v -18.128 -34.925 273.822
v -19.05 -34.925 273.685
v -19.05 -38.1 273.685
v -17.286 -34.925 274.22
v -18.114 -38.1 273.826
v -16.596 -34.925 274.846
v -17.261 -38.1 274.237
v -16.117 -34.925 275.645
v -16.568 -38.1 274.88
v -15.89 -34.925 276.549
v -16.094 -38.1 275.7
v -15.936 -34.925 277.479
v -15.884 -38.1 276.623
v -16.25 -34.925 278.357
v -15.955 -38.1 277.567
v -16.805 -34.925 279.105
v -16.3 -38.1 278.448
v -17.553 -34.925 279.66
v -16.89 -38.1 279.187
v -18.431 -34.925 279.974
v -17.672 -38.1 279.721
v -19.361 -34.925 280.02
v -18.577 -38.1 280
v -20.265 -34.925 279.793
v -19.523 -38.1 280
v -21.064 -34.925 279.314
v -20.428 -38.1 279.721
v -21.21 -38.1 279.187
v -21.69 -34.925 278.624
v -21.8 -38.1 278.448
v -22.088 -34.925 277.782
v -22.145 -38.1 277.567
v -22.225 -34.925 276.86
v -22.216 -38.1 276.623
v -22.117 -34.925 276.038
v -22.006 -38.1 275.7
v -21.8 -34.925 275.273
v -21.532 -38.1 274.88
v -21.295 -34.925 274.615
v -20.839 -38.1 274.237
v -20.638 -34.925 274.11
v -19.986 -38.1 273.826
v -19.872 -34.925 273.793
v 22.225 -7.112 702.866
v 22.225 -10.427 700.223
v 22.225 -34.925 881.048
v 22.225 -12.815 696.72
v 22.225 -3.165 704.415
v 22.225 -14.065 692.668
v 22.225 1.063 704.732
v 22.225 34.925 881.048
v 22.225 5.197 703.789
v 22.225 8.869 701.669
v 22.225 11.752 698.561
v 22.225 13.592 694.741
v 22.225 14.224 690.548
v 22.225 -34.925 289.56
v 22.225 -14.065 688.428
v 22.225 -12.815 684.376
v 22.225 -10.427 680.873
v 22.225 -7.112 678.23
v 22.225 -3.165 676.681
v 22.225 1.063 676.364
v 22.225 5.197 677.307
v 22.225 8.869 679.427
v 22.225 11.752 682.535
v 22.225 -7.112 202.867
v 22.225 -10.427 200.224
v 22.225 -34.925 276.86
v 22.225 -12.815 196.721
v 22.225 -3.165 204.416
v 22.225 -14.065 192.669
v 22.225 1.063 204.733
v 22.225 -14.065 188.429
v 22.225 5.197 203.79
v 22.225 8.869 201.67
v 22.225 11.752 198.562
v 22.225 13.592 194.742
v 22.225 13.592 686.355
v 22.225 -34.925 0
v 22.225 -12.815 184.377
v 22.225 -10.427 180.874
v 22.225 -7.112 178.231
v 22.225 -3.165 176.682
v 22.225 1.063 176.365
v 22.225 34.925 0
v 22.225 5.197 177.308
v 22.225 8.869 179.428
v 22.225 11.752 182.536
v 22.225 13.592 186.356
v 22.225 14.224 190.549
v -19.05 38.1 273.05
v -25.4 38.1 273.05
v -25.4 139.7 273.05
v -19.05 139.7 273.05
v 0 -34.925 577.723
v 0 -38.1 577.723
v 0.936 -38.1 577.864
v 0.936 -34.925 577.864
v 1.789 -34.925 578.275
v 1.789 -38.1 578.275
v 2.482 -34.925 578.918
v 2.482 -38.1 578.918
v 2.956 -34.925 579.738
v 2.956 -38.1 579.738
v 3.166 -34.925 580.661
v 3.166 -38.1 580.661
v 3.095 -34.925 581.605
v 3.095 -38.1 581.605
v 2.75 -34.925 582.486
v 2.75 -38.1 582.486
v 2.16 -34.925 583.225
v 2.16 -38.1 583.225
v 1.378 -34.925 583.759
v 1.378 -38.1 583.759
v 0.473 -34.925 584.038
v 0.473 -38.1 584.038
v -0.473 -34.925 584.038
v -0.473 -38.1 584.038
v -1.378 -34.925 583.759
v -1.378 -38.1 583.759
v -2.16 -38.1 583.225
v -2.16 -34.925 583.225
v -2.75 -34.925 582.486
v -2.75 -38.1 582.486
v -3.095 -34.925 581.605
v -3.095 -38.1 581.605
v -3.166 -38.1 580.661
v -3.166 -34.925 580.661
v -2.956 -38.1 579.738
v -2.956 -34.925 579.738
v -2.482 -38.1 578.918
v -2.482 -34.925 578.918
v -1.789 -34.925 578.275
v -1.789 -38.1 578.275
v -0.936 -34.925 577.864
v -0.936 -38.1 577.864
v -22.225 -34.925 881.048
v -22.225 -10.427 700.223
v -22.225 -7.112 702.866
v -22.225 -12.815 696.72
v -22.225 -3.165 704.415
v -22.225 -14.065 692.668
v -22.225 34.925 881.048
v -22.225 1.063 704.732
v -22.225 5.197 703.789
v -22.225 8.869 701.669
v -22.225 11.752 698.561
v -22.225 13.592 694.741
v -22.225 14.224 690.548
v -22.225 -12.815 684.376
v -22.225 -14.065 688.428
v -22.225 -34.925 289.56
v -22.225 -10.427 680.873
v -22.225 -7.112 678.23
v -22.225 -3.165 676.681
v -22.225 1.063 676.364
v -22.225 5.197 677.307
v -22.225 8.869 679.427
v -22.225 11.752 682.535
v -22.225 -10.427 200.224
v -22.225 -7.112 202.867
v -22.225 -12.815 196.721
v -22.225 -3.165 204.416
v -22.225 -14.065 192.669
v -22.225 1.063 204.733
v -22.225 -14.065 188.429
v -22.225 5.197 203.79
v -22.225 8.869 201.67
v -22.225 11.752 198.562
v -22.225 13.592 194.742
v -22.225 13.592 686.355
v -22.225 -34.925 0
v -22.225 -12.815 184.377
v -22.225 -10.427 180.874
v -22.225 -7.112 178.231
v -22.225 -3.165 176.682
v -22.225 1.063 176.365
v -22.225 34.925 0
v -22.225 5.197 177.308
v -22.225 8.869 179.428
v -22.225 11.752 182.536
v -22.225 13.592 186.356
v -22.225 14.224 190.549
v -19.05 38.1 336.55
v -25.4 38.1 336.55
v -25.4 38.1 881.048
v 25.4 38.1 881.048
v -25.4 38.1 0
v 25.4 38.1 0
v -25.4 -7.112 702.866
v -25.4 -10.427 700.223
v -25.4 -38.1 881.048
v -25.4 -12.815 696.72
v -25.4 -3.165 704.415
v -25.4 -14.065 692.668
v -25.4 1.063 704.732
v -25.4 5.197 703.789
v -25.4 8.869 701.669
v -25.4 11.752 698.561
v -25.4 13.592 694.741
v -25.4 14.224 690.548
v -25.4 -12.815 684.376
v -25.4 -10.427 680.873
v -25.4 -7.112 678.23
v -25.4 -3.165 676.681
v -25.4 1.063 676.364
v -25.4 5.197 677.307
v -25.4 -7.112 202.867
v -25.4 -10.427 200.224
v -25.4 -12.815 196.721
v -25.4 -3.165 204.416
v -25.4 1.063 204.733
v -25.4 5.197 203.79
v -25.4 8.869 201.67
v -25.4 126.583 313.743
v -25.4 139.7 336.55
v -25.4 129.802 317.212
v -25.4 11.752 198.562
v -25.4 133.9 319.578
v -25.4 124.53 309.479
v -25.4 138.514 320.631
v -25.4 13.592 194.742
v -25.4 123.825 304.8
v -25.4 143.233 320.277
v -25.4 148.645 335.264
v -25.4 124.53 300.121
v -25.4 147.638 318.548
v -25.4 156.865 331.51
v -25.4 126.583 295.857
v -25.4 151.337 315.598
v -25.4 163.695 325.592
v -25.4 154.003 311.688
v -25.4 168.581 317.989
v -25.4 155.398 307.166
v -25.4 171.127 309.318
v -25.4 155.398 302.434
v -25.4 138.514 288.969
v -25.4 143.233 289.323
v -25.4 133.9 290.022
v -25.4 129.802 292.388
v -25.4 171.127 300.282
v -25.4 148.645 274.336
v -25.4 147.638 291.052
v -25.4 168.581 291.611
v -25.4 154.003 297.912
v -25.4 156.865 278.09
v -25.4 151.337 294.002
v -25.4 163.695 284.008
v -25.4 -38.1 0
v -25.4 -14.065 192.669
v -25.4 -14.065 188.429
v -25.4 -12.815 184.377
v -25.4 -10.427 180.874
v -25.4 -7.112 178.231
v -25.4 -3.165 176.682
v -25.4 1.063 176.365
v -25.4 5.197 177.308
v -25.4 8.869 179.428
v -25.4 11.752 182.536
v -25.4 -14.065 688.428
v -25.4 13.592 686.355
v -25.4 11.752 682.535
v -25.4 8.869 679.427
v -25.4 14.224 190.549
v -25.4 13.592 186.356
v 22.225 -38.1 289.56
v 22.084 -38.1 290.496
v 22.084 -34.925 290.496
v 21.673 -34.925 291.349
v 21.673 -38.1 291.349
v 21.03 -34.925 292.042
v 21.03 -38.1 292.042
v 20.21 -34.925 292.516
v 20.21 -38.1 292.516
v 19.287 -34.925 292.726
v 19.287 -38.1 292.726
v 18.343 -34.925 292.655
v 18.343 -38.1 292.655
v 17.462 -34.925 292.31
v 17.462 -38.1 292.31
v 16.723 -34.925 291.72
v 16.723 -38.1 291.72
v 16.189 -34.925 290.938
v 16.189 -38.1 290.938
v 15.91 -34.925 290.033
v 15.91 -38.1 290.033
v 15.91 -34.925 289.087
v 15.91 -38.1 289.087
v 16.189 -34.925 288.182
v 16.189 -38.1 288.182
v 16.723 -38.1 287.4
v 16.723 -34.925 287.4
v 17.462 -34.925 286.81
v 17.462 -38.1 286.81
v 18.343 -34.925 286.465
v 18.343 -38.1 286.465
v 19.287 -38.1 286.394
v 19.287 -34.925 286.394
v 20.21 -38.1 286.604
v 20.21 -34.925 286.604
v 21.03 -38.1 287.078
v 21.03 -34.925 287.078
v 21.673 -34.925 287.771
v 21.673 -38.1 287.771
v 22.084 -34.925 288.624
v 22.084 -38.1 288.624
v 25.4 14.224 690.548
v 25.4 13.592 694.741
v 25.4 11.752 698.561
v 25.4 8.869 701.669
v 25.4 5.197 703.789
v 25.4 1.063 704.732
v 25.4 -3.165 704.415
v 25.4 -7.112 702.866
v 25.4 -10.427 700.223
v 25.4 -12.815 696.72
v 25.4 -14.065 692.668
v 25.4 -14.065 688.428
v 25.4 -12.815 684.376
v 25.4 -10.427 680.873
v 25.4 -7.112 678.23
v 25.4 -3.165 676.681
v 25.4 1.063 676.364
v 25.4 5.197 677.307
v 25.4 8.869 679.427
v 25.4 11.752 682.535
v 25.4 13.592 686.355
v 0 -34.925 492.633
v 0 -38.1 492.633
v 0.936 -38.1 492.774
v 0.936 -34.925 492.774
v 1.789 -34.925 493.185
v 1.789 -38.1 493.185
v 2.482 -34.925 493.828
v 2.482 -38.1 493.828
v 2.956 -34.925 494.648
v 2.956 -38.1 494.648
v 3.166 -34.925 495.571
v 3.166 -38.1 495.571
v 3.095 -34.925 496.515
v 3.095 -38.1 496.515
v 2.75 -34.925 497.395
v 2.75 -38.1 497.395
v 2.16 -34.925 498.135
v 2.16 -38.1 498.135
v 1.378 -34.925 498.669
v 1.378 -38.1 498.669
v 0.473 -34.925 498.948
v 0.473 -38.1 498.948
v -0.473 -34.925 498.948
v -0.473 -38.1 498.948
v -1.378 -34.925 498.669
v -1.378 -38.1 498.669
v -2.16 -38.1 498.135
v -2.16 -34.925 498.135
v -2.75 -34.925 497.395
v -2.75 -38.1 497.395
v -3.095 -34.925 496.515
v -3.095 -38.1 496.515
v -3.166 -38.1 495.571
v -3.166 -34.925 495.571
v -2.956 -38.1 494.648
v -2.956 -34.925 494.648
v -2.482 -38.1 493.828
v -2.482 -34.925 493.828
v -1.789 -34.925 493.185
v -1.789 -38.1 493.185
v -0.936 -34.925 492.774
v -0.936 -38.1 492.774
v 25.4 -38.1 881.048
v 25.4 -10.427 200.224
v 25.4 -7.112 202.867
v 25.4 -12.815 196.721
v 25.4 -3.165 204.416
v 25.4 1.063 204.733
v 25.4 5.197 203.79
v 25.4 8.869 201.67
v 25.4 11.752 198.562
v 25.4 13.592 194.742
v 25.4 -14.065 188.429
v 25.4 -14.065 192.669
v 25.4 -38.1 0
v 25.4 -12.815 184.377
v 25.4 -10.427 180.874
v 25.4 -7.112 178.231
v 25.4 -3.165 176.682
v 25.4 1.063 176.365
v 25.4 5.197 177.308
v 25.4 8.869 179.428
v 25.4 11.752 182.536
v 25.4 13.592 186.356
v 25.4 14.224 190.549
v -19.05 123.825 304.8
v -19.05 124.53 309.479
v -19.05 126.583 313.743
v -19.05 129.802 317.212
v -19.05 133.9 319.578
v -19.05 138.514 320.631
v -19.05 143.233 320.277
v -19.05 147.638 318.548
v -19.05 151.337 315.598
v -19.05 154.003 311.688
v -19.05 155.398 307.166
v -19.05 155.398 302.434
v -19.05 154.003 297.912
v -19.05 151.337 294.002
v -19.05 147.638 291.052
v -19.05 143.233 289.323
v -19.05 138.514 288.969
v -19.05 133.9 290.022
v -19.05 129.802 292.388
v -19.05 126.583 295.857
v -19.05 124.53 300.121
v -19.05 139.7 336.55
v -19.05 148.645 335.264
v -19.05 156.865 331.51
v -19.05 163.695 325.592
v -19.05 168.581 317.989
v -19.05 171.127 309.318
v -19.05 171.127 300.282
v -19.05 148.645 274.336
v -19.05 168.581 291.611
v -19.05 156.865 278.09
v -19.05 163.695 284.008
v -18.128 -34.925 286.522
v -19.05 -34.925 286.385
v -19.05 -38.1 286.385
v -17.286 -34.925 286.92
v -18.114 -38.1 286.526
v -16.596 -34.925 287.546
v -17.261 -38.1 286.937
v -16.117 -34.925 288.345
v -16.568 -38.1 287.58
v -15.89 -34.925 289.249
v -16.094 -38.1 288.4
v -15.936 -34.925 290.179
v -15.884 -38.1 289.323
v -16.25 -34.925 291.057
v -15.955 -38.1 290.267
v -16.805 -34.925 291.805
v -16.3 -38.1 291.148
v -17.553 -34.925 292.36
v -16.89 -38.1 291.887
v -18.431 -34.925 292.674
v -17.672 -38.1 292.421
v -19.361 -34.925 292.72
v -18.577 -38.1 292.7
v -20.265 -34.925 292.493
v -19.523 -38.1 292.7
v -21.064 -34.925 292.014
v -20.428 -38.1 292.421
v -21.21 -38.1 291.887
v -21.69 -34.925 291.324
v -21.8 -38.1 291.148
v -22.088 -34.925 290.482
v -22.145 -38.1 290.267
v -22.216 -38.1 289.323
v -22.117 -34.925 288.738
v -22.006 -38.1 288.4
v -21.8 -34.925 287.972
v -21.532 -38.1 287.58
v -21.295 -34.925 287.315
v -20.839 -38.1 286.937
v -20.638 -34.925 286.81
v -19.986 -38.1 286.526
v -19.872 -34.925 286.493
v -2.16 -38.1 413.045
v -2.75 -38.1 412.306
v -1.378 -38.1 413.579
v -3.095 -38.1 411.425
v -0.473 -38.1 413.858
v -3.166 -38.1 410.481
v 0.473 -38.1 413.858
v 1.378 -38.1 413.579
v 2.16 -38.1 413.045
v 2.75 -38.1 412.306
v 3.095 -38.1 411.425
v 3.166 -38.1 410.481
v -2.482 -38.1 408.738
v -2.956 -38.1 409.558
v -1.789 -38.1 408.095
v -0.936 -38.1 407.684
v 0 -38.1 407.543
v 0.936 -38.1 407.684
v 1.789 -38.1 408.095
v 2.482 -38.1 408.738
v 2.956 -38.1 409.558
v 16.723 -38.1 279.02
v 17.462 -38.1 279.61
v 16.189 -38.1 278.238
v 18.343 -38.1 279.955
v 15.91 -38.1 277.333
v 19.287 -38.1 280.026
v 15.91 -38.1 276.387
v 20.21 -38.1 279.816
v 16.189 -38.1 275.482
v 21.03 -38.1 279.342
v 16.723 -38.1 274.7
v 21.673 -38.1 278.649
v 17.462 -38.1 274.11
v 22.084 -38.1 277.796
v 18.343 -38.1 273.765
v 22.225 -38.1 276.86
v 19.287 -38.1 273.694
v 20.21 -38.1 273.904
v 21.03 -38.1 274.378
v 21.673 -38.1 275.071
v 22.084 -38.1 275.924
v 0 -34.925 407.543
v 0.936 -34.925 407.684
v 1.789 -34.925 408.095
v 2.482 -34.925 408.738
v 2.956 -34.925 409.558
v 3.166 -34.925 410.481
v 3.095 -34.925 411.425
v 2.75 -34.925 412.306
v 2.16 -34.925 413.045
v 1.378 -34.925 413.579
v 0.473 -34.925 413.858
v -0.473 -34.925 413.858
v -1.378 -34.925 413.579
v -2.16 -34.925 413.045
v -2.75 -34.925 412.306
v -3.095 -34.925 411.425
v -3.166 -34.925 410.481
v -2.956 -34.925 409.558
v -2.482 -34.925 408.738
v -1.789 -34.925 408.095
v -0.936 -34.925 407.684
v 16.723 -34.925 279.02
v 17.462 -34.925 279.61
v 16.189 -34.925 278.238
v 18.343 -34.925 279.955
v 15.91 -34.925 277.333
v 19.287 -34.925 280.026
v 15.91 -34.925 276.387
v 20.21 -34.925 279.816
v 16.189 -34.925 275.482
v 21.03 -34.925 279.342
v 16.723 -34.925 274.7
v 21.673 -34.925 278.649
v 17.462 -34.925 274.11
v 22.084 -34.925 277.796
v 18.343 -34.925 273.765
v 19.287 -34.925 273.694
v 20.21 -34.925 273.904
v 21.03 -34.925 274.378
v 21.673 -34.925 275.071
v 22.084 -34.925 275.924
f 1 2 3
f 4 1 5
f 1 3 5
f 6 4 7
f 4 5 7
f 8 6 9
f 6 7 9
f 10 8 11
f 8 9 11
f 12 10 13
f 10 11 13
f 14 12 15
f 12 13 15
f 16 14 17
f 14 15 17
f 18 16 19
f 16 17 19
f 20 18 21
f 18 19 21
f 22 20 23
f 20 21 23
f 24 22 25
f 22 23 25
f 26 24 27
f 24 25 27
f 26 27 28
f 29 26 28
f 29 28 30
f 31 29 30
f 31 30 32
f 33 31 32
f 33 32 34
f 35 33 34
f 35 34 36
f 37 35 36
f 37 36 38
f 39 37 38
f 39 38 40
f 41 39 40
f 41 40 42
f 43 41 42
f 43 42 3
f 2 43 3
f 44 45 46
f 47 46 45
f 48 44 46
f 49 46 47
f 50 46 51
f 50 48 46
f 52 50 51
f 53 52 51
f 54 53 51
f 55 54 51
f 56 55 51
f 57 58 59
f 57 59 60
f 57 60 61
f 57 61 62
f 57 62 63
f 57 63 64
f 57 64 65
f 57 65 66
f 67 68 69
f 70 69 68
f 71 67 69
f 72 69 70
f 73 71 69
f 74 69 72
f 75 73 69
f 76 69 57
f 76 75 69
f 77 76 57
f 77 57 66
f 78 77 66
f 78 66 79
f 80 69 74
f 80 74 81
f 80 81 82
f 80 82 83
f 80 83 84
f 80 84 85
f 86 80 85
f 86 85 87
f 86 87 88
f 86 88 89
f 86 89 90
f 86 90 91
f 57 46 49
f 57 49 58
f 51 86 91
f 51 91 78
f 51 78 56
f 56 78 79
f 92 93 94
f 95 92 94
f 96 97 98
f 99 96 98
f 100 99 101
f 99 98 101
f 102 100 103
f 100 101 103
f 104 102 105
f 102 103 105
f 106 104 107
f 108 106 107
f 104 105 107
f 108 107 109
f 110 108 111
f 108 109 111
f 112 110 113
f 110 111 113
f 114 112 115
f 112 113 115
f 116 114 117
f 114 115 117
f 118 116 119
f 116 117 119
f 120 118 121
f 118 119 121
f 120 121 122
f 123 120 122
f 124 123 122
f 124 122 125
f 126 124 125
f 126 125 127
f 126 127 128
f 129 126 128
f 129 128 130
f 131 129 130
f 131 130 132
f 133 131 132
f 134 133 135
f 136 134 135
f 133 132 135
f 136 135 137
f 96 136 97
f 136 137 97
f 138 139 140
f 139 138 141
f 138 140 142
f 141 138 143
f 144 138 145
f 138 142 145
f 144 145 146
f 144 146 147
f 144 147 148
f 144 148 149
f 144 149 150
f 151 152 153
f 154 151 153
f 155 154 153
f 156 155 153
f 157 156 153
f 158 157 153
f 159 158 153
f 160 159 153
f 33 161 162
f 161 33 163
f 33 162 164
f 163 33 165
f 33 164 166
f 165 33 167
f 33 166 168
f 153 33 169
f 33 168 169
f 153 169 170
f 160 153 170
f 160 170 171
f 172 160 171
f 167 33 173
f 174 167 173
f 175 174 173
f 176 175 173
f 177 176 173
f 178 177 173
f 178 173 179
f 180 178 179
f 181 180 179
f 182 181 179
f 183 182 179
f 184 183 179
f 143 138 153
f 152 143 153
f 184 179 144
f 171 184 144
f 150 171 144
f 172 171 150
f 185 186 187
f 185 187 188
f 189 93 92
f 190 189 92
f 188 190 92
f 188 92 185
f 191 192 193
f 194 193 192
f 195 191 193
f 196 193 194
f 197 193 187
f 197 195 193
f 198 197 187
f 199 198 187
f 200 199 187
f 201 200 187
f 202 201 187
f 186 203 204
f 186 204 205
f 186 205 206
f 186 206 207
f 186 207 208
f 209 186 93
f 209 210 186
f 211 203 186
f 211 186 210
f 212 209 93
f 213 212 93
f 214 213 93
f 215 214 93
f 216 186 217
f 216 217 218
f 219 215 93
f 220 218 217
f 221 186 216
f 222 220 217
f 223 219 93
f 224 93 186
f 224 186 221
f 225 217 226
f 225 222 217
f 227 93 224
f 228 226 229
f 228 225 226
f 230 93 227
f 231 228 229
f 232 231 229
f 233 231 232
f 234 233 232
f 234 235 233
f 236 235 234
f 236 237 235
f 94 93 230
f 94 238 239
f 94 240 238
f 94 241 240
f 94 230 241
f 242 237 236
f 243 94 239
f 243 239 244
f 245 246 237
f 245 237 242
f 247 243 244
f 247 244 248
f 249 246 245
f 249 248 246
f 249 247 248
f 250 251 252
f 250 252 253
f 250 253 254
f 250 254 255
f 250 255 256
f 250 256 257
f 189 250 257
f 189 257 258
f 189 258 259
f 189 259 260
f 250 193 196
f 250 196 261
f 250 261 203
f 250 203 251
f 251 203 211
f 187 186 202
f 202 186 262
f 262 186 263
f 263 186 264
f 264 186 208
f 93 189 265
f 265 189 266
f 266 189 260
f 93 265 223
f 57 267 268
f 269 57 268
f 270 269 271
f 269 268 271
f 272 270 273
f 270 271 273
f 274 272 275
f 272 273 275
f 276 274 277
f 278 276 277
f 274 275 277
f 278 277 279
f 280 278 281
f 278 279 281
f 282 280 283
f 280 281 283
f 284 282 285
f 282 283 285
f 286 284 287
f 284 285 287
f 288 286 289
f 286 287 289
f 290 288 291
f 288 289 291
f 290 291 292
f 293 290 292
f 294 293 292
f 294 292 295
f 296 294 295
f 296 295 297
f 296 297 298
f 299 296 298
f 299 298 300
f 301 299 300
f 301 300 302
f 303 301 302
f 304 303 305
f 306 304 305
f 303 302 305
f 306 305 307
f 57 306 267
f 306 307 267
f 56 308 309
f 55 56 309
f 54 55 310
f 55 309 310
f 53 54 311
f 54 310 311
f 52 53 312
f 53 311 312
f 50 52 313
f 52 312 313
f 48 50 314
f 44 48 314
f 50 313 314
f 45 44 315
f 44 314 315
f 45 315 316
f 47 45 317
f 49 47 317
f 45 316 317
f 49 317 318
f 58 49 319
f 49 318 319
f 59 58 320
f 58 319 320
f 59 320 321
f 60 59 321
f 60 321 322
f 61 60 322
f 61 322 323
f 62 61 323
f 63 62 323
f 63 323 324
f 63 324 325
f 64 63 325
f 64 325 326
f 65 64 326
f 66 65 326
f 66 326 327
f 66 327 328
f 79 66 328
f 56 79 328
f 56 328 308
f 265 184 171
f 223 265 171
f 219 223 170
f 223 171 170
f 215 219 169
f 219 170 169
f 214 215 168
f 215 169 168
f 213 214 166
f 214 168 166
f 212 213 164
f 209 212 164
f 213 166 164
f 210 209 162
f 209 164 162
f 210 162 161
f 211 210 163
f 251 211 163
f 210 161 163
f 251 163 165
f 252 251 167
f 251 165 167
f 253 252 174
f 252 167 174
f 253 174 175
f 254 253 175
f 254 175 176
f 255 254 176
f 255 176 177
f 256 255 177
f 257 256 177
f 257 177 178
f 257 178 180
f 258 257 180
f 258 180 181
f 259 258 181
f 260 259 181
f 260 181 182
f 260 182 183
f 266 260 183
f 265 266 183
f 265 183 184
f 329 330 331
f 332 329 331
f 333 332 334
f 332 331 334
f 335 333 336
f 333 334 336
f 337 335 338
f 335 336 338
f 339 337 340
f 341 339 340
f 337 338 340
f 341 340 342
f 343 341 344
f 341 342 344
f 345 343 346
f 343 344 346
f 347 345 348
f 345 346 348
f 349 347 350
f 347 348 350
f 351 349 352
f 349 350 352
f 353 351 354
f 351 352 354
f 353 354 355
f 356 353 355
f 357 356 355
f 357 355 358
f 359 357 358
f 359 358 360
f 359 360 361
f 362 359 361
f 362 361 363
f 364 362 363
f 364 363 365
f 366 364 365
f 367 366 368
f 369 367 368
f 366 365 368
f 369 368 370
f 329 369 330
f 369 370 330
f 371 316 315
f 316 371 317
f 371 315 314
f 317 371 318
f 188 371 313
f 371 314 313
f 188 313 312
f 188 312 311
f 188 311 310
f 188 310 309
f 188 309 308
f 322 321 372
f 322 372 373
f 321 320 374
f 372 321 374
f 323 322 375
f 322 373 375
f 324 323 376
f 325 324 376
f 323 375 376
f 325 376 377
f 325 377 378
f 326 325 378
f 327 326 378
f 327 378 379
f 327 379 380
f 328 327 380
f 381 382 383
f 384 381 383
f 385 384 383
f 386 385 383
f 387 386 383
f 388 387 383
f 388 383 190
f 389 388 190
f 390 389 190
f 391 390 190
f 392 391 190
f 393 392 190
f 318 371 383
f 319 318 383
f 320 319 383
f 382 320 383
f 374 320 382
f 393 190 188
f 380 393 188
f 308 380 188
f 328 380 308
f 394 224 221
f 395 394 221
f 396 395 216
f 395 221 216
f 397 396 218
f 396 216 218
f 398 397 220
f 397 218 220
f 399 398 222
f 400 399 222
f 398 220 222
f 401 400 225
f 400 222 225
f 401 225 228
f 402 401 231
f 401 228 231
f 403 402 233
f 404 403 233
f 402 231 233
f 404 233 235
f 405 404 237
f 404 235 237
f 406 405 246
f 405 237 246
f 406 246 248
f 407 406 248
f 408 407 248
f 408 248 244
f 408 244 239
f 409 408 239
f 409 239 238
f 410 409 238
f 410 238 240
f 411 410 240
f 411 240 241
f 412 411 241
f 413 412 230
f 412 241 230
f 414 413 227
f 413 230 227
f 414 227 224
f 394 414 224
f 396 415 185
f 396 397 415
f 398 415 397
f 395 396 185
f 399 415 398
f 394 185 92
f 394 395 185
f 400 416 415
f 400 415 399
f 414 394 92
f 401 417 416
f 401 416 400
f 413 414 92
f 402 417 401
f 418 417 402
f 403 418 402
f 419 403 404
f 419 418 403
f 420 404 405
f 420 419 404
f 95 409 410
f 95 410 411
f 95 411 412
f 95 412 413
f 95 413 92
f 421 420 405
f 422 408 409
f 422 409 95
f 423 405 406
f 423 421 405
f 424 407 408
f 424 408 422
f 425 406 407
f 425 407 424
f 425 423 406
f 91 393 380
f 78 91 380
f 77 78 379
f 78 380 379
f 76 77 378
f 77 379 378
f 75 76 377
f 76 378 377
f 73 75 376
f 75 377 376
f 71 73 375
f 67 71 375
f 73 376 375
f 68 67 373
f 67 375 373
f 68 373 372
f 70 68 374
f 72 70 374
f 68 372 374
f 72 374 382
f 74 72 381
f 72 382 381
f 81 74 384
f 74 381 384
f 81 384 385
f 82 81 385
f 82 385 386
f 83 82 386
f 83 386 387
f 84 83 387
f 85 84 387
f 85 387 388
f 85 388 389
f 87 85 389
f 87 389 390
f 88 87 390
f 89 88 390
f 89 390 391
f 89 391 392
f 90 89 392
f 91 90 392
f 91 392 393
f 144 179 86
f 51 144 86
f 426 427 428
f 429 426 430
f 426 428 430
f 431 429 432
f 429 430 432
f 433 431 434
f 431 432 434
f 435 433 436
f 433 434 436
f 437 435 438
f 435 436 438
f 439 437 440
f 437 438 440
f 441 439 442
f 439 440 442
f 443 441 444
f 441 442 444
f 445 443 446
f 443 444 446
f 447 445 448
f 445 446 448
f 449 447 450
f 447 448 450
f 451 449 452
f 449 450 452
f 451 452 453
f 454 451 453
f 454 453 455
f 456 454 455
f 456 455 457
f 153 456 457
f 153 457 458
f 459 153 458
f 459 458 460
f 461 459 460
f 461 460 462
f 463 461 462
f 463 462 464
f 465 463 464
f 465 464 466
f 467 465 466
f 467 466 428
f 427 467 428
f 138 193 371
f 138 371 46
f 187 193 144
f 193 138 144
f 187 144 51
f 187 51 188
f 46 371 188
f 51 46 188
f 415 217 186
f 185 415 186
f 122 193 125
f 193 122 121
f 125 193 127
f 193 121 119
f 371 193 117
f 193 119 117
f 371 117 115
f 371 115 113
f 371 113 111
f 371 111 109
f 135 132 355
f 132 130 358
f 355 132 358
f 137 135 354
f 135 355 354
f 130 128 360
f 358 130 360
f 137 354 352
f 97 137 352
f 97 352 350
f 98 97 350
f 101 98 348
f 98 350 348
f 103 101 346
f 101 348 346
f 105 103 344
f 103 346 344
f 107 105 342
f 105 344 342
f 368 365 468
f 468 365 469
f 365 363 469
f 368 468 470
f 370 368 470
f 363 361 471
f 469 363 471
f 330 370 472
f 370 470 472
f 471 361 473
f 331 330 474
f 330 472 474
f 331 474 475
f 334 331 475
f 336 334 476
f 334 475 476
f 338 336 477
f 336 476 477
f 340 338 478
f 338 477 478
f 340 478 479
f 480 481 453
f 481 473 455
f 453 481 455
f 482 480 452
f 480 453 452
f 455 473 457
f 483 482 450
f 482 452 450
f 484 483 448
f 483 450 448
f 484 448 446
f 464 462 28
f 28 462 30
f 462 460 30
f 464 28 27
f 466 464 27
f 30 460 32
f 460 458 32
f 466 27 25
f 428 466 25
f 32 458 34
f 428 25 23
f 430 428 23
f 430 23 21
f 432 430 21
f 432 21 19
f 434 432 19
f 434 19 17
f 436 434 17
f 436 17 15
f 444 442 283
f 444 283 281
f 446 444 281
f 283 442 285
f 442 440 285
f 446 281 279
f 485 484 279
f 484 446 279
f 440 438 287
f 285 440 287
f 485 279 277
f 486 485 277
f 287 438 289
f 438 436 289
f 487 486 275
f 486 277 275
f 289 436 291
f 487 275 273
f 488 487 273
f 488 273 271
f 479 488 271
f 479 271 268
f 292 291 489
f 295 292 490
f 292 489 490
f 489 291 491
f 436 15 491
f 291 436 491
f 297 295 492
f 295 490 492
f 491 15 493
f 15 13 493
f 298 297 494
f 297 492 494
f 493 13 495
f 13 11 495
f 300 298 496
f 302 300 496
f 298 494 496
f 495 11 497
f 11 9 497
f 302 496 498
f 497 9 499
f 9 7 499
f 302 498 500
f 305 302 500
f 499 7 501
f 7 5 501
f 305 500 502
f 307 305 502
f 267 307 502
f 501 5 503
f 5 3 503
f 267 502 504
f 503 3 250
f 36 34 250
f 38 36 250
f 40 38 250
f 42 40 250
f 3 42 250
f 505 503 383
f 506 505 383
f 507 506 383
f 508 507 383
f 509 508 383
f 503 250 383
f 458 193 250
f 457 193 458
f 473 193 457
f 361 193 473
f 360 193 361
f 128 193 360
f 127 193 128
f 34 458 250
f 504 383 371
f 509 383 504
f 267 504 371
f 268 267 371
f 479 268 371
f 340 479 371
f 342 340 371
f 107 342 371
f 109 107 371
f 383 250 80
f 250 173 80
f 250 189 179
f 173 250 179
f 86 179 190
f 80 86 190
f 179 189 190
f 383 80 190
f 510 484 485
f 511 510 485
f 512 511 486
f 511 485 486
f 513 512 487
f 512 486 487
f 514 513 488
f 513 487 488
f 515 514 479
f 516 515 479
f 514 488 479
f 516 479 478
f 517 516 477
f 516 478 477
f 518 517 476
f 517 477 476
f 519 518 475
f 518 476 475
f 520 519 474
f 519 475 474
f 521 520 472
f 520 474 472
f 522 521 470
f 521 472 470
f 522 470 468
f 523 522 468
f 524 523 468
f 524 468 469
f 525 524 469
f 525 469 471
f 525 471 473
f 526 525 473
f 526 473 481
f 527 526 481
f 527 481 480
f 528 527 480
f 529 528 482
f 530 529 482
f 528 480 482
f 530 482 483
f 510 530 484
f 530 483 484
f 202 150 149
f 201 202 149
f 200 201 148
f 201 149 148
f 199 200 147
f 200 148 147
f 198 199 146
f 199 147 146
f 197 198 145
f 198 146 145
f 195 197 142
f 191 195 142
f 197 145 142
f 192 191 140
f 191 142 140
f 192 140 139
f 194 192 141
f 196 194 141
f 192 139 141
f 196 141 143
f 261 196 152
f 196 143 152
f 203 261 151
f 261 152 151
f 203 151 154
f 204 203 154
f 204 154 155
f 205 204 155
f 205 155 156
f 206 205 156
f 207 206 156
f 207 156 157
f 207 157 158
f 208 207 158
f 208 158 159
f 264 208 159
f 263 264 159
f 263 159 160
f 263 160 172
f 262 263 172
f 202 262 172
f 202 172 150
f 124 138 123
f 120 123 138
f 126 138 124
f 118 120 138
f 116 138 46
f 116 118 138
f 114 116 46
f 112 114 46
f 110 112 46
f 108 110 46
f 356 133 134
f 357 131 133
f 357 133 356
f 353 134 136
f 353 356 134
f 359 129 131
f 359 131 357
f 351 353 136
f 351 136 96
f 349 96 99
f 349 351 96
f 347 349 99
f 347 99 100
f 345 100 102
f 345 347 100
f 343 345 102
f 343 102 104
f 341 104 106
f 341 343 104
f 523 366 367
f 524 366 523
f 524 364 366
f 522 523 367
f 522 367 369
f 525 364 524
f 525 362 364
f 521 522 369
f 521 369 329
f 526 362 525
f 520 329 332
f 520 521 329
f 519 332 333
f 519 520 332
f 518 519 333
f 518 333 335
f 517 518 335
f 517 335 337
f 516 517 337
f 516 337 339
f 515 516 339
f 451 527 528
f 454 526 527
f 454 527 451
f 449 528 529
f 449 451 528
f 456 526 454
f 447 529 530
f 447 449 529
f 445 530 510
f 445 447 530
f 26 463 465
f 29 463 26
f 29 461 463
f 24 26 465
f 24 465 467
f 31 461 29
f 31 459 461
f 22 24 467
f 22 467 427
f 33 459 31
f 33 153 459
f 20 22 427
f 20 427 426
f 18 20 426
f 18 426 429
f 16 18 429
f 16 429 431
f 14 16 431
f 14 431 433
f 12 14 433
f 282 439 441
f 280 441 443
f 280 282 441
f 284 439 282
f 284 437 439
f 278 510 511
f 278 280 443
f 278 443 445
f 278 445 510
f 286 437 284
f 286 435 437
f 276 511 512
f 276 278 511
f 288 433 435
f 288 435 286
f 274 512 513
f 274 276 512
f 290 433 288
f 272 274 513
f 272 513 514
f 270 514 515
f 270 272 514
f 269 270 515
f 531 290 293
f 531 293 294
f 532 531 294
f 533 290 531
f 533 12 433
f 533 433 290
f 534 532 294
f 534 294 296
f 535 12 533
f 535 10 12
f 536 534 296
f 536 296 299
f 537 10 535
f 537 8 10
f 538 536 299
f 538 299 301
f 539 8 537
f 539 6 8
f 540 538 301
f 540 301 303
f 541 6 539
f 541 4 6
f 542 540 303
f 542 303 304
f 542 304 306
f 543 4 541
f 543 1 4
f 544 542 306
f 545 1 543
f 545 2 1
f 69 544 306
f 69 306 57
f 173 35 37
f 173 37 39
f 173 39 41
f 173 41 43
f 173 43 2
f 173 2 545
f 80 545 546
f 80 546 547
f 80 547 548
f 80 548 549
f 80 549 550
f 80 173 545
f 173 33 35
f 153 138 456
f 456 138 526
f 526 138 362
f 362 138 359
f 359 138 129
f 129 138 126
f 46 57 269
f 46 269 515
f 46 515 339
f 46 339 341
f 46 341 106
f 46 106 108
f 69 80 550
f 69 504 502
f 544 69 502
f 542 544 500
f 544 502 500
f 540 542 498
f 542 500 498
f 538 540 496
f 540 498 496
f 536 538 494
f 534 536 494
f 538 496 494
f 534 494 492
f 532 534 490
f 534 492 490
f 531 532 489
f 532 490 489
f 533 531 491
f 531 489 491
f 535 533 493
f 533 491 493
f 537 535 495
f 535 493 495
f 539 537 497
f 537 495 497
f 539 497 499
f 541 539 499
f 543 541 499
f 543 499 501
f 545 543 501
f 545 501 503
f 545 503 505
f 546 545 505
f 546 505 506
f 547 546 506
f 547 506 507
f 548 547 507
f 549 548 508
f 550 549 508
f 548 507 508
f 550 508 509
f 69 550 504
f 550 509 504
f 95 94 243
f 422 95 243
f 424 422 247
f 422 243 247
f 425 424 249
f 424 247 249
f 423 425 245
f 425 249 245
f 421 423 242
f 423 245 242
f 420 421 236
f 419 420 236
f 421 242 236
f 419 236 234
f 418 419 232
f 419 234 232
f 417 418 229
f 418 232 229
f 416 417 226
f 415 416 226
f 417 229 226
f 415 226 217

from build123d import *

# Parameters (mm, degrees)
SKETCH1_W           = 50.8
SKETCH1_H           = 76.2
SKETCH1_W_2         = 44.45
SKETCH1_H_2         = 69.85
BOSS_EXTRUDE1_DEPTH = 965.2
CUT_EXTRUDE1_REACH  = 969.287
SKETCH4_R           = 14.224
SKETCH5_R           = 3.175
CUT_EXTRUDE2_DEPTH  = 3.175
CUT_EXTRUDE3_REACH  = 969.287
SKETCH6_W           = 84.151951589
SKETCH6_H           = 76.2
SKETCH7_R           = 15.875
BOSS_EXTRUDE2_DEPTH = 6.35


with BuildPart() as part:
    # Sketch1 → Boss-Extrude1 (new body)
    with BuildSketch(Plane.XY):
        Rectangle(SKETCH1_W, SKETCH1_H)
        Rectangle(SKETCH1_W_2, SKETCH1_H_2, mode=Mode.SUBTRACT)
    extrude(amount=BOSS_EXTRUDE1_DEPTH)

    # Cut-Extrude1: up to this face of the body (flat: up to its plane)
    cut_extrude1_end = Plane(part.part.faces().sort_by_distance((-25.4, 0, 482.6))[0])
    # Sketch4 → Cut-Extrude1 (cut, up to the picked face)
    with BuildSketch(Plane(origin=(25.4, 0, 0), x_dir=(0, 0, -1), z_dir=(1, 0, 0)), mode=Mode.PRIVATE) as cut_extrude1_sk1:
        with Locations(Location((-690.548048411, 0, 0), (0, 0, 90))):
            Circle(SKETCH4_R)
    cut_extrude1_tool1 = split(extrude(cut_extrude1_sk1.sketch, amount=-CUT_EXTRUDE1_REACH, mode=Mode.PRIVATE), bisect_by=cut_extrude1_end, keep=Keep.BOTH, mode=Mode.PRIVATE)
    # Sketch4 → Cut-Extrude1 (cut, up to the picked face)
    with BuildSketch(Plane(origin=(25.4, 0, 0), x_dir=(0, 0, -1), z_dir=(1, 0, 0)), mode=Mode.PRIVATE) as cut_extrude1_sk2:
        with Locations(Location((-190.549048411, 0, 0), (0, 0, 90))):
            Circle(SKETCH4_R)
    cut_extrude1_tool2 = split(extrude(cut_extrude1_sk2.sketch, amount=-CUT_EXTRUDE1_REACH, mode=Mode.PRIVATE), bisect_by=cut_extrude1_end, keep=Keep.BOTH, mode=Mode.PRIVATE)
    add(cut_extrude1_tool1.solids().sort_by(Axis((25.4, 0, 690.548048), (-1, 0, 0)))[0], mode=Mode.SUBTRACT)
    add(cut_extrude1_tool2.solids().sort_by(Axis((25.4, 0, 190.549048), (-1, 0, 0)))[0], mode=Mode.SUBTRACT)

    # Sketch5 → Cut-Extrude2 (cut)
    with BuildSketch(Plane.XZ.offset(38.1)):
        with Locations(Location((-19.05, 276.86, 0), (0, 0, 270))):
            Circle(SKETCH5_R)
        with Locations(Location((-19.05, 289.56, 0), (0, 0, 270))):
            Circle(SKETCH5_R)
        with Locations((19.05, 276.86)):
            Circle(SKETCH5_R)
        with Locations((19.05, 289.56)):
            Circle(SKETCH5_R)
        with Locations(Location((0, 410.718, 0), (0, 0, 270))):
            Circle(SKETCH5_R)
        with Locations(Location((0, 580.898, 0), (0, 0, 270))):
            Circle(SKETCH5_R)
        with Locations(Location((0, 495.808, 0), (0, 0, 270))):
            Circle(SKETCH5_R)
    extrude(amount=-CUT_EXTRUDE2_DEPTH, mode=Mode.SUBTRACT)

    # Cut-Extrude3: up to this face of the body (flat: up to its plane)
    cut_extrude3_end = Plane(part.part.faces().sort_by_distance((-25.4, 0, 483.339612352))[0])
    # Sketch6 → Cut-Extrude3 (cut, up to the picked face)
    with BuildSketch(Plane(origin=(25.4, 0, 0), x_dir=(0, 0, -1), z_dir=(1, 0, 0)), mode=Mode.PRIVATE) as cut_extrude3_sk1:
        with Locations((-923.124024206, 0)):
            Rectangle(SKETCH6_W, SKETCH6_H)
    cut_extrude3_tool1 = split(extrude(cut_extrude3_sk1.sketch, amount=-CUT_EXTRUDE3_REACH, mode=Mode.PRIVATE), bisect_by=cut_extrude3_end, keep=Keep.BOTH, mode=Mode.PRIVATE)
    add(cut_extrude3_tool1.solids().sort_by(Axis((25.4, 0, 923.124024), (-1, 0, 0)))[0], mode=Mode.SUBTRACT)

    # Sketch7 → Boss-Extrude2 (add)
    with BuildSketch(Plane.ZY.offset(25.4)):
        with BuildLine():
            Line((336.55, 139.7), (336.55, 38.1))
            Line((336.55, 38.1), (273.05, 38.1))
            Line((273.05, 38.1), (273.05, 139.7))
            ThreePointArc((273.05, 139.7), (304.8, 171.45), (336.55, 139.7))
        make_face()
        with Locations(Location((304.8, 139.7, 0), (0, 0, 270))):
            Circle(SKETCH7_R, mode=Mode.SUBTRACT)
    extrude(amount=-BOSS_EXTRUDE2_DEPTH)


solid = part.part
